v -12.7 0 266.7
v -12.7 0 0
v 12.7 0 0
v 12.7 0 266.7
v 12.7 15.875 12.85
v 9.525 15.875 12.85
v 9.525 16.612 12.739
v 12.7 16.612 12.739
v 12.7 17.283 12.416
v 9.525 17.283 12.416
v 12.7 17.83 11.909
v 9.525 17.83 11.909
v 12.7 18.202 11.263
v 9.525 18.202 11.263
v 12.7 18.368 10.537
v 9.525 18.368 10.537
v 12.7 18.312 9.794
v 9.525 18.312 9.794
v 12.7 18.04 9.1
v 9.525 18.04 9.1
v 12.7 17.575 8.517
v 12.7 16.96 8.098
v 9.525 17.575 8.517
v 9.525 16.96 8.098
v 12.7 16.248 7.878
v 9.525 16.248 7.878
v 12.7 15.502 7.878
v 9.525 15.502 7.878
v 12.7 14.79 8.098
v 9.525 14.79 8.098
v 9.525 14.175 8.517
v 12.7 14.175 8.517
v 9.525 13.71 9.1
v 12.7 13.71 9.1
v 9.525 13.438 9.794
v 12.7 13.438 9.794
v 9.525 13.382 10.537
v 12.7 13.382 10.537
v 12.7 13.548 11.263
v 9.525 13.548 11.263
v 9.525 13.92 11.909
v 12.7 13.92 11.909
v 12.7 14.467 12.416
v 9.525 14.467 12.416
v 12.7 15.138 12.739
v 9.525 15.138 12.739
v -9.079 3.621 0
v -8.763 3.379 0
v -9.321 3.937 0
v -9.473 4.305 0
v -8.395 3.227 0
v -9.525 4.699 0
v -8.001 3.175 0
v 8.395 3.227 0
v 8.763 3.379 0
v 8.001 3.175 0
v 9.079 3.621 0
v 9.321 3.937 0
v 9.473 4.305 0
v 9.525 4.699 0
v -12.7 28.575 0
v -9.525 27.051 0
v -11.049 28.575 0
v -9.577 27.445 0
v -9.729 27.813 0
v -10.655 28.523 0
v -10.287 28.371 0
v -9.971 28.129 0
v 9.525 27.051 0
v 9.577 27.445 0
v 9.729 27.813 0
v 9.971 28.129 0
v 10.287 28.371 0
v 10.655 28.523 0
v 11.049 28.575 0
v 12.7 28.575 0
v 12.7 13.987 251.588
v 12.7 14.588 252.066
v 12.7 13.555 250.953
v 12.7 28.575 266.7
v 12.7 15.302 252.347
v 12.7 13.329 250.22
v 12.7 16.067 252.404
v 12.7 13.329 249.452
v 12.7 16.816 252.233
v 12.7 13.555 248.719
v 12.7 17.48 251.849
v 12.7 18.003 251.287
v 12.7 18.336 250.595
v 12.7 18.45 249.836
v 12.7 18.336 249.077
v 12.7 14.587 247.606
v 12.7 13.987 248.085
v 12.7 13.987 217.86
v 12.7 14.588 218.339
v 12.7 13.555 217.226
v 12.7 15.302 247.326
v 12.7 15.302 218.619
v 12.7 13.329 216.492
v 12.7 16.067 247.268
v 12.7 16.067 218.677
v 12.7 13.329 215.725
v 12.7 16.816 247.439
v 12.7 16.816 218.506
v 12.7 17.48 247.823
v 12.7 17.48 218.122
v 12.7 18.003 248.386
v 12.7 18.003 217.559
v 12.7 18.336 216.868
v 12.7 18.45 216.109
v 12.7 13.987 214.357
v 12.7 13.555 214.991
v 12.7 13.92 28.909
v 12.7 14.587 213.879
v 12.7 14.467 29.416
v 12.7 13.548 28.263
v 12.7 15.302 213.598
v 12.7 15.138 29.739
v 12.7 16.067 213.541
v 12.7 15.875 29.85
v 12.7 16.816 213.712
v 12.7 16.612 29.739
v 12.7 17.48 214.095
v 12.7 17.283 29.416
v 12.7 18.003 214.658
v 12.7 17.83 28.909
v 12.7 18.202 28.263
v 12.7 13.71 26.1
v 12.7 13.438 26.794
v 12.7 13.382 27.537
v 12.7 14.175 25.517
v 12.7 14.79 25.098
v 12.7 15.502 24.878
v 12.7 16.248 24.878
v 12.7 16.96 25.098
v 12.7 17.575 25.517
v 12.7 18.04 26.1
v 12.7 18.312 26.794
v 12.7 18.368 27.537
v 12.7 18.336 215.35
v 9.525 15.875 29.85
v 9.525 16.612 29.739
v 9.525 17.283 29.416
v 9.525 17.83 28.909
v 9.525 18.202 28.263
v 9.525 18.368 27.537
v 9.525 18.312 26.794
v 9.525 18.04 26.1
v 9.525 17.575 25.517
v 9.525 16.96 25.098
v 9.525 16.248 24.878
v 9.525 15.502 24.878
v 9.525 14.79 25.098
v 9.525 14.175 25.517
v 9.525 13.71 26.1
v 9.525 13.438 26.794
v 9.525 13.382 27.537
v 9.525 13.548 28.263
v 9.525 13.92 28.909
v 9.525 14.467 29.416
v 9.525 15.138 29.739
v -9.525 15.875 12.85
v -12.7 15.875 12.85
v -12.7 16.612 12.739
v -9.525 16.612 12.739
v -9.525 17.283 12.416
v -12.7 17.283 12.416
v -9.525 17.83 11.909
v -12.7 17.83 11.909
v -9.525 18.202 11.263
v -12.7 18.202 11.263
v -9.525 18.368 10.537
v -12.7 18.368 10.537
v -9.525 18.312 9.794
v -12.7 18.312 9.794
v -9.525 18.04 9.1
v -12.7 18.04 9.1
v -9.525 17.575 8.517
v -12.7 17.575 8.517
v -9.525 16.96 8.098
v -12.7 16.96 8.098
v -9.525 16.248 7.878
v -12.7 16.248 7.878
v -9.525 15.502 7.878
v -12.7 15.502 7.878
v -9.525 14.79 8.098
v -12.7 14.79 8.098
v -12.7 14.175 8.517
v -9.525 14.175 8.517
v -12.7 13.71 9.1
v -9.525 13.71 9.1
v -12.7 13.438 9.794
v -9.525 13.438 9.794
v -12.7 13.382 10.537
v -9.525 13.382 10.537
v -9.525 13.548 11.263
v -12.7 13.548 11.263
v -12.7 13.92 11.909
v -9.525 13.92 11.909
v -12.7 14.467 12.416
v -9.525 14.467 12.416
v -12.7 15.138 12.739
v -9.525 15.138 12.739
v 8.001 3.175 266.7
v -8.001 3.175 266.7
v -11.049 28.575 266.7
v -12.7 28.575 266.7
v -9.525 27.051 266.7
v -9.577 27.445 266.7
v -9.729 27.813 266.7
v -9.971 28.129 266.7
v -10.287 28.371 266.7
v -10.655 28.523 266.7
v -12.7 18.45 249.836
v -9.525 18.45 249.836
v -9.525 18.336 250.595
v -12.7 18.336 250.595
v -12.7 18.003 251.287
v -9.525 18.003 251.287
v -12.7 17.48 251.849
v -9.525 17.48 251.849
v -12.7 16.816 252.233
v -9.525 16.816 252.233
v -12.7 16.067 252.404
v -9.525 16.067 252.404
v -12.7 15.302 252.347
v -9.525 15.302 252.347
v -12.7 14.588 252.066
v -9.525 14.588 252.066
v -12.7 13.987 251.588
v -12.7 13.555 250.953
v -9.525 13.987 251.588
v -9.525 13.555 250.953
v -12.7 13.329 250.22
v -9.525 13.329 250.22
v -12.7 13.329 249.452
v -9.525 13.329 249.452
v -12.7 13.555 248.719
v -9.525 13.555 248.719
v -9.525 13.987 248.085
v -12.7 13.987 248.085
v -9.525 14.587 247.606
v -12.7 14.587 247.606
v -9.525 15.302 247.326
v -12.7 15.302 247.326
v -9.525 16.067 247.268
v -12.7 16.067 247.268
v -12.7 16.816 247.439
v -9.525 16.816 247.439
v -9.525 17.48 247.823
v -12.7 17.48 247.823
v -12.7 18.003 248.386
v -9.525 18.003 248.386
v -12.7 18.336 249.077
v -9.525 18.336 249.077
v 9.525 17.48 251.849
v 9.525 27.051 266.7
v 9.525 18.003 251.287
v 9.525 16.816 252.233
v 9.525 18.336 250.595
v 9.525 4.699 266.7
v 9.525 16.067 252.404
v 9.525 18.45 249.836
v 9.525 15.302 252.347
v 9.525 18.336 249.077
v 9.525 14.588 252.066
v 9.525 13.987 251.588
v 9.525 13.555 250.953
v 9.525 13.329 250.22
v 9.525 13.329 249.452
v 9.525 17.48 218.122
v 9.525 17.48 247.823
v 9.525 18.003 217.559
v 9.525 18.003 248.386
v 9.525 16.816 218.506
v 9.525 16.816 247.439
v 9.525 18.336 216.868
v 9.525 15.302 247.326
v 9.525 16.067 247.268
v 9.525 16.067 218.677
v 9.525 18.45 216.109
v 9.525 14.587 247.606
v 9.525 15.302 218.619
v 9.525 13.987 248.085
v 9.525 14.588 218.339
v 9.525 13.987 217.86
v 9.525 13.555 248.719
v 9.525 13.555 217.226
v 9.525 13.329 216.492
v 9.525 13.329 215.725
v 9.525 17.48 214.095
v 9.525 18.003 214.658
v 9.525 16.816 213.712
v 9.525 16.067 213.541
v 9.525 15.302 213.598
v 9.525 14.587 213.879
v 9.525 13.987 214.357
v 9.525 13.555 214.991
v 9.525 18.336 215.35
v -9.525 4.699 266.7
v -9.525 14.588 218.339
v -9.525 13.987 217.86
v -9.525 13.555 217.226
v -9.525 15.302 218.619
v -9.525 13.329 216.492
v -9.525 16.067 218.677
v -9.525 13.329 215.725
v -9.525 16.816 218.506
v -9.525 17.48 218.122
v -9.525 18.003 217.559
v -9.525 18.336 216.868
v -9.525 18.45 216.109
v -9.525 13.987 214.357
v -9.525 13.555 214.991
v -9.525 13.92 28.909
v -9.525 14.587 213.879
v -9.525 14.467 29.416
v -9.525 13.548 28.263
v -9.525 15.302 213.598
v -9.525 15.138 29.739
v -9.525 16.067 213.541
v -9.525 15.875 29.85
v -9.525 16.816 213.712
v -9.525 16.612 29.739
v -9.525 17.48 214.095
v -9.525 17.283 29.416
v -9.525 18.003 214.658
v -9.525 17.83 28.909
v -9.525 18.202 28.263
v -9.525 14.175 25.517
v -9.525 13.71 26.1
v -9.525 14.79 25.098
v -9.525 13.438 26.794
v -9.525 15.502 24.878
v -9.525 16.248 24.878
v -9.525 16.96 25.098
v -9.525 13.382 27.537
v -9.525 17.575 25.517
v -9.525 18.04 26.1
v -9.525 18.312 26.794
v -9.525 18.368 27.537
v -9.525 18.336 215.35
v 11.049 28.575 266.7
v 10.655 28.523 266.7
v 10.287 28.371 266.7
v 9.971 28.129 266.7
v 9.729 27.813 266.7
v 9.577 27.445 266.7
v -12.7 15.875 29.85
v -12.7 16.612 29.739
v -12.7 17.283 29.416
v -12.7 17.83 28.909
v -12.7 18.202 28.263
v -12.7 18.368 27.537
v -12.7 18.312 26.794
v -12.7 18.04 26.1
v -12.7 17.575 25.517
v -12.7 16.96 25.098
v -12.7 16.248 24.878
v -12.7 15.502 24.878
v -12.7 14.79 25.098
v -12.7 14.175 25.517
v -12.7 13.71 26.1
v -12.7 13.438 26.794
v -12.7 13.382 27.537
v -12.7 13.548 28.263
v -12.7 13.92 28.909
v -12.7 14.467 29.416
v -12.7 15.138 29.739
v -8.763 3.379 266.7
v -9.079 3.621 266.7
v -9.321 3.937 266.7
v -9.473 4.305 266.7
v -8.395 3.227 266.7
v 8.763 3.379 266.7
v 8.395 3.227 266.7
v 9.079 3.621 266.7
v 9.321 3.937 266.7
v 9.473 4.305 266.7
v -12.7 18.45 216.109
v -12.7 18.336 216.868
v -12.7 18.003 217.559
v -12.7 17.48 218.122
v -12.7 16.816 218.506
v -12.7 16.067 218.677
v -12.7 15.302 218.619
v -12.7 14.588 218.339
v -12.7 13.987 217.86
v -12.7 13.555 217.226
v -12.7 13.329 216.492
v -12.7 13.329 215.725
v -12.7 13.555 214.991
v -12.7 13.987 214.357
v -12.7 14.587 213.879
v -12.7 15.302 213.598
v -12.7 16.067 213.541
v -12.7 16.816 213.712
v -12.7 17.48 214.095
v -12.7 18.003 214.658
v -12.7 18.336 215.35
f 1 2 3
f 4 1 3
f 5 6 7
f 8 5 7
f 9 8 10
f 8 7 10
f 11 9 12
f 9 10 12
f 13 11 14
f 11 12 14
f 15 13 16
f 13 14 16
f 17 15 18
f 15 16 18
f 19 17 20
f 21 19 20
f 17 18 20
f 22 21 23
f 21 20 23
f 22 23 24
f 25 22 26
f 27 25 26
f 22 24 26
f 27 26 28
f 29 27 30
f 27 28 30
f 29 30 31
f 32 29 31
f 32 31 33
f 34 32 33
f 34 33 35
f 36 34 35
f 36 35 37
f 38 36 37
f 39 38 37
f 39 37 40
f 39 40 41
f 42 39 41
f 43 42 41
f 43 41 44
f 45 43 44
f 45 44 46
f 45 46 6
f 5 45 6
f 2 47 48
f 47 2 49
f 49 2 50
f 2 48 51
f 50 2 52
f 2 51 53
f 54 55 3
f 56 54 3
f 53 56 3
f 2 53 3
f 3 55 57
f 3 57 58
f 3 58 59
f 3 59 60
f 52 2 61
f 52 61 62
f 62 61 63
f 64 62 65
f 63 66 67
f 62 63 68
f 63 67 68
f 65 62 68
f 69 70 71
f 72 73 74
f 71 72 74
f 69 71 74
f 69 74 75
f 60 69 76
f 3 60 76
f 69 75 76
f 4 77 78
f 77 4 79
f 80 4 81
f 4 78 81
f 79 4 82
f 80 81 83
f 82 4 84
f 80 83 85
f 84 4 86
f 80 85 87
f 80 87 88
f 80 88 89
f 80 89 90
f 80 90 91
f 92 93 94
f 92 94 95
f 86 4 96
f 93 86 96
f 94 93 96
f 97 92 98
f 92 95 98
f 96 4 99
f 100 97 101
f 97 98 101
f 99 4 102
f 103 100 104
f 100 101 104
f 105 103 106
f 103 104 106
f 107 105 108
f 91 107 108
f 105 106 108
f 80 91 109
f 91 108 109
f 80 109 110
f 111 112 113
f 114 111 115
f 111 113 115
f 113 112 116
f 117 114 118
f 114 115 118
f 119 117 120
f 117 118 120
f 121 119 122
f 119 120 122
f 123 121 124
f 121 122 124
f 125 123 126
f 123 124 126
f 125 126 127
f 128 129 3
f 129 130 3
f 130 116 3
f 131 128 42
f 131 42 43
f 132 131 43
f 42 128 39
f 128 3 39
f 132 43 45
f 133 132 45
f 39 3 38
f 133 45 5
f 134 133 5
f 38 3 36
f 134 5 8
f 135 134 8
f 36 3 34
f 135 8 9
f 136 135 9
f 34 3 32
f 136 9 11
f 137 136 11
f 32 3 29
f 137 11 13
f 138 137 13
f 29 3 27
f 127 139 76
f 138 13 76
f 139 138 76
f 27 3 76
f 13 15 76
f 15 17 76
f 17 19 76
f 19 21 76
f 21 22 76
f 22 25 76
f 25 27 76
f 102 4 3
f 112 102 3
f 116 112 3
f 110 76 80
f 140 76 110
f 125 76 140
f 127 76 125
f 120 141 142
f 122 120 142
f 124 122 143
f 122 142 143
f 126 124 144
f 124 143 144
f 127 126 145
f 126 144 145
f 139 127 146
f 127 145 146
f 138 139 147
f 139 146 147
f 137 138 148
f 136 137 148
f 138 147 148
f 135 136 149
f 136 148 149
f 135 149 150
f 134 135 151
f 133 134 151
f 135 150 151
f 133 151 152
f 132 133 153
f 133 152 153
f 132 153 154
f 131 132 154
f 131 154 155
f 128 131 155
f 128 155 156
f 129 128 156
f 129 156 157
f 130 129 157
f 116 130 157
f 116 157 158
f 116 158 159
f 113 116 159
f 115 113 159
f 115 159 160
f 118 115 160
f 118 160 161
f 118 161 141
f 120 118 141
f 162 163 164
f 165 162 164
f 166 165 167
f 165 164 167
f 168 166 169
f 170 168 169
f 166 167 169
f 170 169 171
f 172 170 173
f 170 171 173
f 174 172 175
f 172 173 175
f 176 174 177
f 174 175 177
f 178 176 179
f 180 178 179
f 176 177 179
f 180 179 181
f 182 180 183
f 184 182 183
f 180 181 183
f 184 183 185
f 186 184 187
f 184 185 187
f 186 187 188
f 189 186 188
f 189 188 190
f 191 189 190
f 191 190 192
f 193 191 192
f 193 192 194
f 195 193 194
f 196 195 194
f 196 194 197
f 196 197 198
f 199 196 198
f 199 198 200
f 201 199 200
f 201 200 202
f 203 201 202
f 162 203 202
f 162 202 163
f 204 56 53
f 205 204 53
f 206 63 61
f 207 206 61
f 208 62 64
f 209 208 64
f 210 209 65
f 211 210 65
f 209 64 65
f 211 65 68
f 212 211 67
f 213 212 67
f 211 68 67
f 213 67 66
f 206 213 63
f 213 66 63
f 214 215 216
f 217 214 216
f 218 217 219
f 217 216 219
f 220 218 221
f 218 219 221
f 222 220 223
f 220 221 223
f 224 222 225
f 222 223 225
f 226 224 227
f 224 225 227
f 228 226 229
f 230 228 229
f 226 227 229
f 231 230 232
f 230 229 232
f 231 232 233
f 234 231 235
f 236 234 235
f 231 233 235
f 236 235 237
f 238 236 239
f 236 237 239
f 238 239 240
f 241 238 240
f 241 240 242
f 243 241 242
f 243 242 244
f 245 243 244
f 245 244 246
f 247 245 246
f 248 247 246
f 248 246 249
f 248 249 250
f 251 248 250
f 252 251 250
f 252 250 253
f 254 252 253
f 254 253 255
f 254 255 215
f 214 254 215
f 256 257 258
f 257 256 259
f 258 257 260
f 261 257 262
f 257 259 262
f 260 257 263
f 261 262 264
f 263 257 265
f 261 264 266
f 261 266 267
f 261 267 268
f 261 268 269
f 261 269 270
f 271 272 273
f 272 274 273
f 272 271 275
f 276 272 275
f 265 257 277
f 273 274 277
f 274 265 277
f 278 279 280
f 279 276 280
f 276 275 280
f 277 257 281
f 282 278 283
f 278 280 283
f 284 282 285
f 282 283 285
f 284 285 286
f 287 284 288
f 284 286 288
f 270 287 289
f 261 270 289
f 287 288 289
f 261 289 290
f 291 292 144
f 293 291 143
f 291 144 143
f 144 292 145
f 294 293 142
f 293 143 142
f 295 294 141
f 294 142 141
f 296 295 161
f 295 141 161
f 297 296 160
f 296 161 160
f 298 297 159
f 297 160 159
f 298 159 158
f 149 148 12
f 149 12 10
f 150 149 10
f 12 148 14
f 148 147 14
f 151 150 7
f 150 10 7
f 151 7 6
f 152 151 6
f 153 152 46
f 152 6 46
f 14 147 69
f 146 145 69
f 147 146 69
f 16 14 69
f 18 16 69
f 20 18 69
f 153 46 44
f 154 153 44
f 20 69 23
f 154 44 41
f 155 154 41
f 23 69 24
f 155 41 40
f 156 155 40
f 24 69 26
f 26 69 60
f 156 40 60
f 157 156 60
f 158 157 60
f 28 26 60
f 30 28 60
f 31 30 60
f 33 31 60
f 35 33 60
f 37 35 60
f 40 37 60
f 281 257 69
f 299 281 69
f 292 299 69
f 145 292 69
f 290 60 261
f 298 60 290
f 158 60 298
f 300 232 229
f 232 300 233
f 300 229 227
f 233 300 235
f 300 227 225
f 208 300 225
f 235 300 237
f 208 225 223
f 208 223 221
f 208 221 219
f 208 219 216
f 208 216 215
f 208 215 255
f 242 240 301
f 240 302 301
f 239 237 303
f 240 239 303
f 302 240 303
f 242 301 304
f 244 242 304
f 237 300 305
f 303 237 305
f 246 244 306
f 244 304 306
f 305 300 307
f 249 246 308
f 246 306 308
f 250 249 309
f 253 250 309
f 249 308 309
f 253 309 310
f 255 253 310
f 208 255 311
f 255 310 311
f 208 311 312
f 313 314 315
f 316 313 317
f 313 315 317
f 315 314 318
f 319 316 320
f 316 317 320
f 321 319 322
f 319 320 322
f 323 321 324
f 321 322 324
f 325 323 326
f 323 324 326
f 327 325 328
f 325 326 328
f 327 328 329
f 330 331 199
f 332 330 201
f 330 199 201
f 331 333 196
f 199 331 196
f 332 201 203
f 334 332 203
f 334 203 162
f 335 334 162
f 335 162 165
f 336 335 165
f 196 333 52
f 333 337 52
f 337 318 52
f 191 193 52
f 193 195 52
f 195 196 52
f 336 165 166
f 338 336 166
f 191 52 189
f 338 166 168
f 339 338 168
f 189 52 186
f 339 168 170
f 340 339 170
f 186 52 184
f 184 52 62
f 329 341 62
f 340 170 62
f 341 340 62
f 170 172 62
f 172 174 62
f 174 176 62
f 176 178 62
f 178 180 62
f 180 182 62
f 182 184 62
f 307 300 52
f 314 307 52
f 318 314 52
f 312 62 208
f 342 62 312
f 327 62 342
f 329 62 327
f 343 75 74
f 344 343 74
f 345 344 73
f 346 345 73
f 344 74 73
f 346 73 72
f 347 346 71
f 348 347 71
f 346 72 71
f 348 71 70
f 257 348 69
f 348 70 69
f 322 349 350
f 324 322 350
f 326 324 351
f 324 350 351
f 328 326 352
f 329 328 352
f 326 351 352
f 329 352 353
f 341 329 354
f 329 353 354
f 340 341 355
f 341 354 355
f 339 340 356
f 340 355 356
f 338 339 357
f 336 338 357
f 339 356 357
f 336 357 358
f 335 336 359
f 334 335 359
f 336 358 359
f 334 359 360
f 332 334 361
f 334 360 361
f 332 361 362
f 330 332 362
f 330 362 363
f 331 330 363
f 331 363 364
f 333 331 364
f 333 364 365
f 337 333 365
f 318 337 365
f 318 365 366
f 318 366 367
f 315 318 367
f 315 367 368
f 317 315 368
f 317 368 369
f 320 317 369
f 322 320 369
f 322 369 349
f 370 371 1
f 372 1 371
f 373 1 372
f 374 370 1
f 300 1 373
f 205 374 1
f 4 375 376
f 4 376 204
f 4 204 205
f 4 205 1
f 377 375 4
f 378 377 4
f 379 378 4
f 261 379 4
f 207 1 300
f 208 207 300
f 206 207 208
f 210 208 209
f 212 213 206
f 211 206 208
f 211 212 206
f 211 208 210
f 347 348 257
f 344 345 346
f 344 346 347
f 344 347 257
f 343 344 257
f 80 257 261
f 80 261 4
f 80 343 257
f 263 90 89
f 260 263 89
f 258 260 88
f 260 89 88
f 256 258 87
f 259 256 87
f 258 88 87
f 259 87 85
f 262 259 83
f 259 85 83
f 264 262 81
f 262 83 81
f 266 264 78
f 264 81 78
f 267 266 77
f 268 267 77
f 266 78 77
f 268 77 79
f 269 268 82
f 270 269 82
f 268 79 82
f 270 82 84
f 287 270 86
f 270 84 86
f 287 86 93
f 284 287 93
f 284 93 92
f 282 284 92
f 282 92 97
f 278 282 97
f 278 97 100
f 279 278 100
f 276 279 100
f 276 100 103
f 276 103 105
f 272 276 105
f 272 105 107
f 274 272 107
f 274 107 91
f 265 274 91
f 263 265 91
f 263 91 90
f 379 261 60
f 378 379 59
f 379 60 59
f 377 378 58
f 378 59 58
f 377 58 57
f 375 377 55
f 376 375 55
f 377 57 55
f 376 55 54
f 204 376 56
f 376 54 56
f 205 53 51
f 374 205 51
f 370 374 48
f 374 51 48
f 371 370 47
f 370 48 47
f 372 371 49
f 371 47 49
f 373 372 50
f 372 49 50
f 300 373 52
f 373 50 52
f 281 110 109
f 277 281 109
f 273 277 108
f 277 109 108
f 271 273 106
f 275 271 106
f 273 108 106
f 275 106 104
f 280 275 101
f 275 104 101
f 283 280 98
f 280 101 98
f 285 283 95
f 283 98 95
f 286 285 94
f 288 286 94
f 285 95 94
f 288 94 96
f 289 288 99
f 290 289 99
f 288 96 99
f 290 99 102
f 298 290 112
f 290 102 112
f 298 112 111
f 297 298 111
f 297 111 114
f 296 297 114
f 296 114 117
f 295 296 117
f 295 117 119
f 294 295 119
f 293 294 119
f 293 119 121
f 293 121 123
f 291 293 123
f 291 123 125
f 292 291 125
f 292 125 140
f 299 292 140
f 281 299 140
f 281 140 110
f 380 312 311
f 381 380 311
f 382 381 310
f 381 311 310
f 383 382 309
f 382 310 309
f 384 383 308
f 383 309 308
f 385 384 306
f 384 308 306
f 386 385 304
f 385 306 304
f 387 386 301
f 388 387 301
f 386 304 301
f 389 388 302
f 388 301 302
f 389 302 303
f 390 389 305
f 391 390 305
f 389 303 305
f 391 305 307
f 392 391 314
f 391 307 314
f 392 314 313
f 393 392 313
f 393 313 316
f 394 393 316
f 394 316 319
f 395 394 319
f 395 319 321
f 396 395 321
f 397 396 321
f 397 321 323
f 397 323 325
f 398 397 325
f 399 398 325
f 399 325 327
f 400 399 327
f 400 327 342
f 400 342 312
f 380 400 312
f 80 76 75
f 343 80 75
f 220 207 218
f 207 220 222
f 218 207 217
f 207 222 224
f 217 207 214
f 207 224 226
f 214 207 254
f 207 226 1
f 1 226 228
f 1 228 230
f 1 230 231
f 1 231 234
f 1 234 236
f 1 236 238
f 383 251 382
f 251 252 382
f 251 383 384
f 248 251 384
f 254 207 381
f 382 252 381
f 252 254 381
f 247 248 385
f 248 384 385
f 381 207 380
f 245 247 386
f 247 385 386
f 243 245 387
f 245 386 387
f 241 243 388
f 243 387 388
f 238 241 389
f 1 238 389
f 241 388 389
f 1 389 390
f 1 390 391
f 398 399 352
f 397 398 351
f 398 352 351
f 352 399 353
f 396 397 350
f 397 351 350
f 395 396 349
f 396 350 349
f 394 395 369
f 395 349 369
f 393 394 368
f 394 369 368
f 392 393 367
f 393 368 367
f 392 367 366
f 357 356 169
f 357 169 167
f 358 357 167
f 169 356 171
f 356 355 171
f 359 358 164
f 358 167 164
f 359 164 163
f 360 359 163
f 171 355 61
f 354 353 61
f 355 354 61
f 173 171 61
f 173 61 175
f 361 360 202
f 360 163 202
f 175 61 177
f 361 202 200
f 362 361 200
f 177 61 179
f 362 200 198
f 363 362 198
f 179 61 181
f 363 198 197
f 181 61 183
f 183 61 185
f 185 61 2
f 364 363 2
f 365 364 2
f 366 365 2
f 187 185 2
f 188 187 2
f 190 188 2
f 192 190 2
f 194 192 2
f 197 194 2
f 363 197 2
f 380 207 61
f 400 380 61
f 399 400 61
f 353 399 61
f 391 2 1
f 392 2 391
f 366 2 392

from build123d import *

# Parameters (mm, degrees)
BOSS_EXTRUDE1_DEPTH = 266.7
SKETCH7_R           = 2.575
CUT_EXTRUDE5_DEPTH  = 270.426391849
SKETCH8_R           = 2.5
CUT_EXTRUDE7_DEPTH  = 270.426391849


with BuildPart() as part:
    # Sketch1 → Boss-Extrude1 (new body)
    with BuildSketch(Plane.XY):
        with BuildLine():
            Line((-12.7, 0), (12.7, 0))
            Line((12.7, 0), (12.7, 6.35))
            Line((12.7, 6.35), (12.7, 28.575))
            Line((12.7, 28.575), (11.049, 28.575))
            ThreePointArc((11.049, 28.575), (9.971369265, 28.128630735), (9.525, 27.051))
            Line((9.525, 27.051), (9.525, 4.699))
            ThreePointArc((9.525, 4.699), (9.078630735, 3.621369265), (8.001, 3.175))
            Line((8.001, 3.175), (-8.001, 3.175))
            ThreePointArc((-8.001, 3.175), (-9.078630735, 3.621369265), (-9.525, 4.699))
            Line((-9.525, 4.699), (-9.525, 27.051))
            ThreePointArc((-9.525, 27.051), (-9.971369265, 28.128630735), (-11.049, 28.575))
            Line((-11.049, 28.575), (-12.7, 28.575))
            Line((-12.7, 28.575), (-12.7, 3.175))
            Line((-12.7, 3.175), (-12.7, 0))
        make_face()
    extrude(amount=BOSS_EXTRUDE1_DEPTH)

    # Sketch7 → Cut-Extrude5 (cut, through all)
    with BuildSketch(Plane(origin=(12.7, 0, 0), x_dir=(0, 0, -1), z_dir=(1, 0, 0))):
        with Locations(Location((-216.108705962, 15.875, 0), (0, 0, 90))):
            Circle(SKETCH7_R)
        with Locations(Location((-249.836235321, 15.875, 0), (0, 0, 90))):
            Circle(SKETCH7_R)
    extrude(amount=-CUT_EXTRUDE5_DEPTH, mode=Mode.SUBTRACT)

    # Sketch8 → Cut-Extrude7 (cut, through all)
    with BuildSketch(Plane.ZY.offset(12.7)):
        with Locations((10.35, 15.875)):
            Circle(SKETCH8_R)
        with Locations((27.35, 15.875)):
            Circle(SKETCH8_R)
    extrude(amount=-CUT_EXTRUDE7_DEPTH, mode=Mode.SUBTRACT)


solid = part.part
